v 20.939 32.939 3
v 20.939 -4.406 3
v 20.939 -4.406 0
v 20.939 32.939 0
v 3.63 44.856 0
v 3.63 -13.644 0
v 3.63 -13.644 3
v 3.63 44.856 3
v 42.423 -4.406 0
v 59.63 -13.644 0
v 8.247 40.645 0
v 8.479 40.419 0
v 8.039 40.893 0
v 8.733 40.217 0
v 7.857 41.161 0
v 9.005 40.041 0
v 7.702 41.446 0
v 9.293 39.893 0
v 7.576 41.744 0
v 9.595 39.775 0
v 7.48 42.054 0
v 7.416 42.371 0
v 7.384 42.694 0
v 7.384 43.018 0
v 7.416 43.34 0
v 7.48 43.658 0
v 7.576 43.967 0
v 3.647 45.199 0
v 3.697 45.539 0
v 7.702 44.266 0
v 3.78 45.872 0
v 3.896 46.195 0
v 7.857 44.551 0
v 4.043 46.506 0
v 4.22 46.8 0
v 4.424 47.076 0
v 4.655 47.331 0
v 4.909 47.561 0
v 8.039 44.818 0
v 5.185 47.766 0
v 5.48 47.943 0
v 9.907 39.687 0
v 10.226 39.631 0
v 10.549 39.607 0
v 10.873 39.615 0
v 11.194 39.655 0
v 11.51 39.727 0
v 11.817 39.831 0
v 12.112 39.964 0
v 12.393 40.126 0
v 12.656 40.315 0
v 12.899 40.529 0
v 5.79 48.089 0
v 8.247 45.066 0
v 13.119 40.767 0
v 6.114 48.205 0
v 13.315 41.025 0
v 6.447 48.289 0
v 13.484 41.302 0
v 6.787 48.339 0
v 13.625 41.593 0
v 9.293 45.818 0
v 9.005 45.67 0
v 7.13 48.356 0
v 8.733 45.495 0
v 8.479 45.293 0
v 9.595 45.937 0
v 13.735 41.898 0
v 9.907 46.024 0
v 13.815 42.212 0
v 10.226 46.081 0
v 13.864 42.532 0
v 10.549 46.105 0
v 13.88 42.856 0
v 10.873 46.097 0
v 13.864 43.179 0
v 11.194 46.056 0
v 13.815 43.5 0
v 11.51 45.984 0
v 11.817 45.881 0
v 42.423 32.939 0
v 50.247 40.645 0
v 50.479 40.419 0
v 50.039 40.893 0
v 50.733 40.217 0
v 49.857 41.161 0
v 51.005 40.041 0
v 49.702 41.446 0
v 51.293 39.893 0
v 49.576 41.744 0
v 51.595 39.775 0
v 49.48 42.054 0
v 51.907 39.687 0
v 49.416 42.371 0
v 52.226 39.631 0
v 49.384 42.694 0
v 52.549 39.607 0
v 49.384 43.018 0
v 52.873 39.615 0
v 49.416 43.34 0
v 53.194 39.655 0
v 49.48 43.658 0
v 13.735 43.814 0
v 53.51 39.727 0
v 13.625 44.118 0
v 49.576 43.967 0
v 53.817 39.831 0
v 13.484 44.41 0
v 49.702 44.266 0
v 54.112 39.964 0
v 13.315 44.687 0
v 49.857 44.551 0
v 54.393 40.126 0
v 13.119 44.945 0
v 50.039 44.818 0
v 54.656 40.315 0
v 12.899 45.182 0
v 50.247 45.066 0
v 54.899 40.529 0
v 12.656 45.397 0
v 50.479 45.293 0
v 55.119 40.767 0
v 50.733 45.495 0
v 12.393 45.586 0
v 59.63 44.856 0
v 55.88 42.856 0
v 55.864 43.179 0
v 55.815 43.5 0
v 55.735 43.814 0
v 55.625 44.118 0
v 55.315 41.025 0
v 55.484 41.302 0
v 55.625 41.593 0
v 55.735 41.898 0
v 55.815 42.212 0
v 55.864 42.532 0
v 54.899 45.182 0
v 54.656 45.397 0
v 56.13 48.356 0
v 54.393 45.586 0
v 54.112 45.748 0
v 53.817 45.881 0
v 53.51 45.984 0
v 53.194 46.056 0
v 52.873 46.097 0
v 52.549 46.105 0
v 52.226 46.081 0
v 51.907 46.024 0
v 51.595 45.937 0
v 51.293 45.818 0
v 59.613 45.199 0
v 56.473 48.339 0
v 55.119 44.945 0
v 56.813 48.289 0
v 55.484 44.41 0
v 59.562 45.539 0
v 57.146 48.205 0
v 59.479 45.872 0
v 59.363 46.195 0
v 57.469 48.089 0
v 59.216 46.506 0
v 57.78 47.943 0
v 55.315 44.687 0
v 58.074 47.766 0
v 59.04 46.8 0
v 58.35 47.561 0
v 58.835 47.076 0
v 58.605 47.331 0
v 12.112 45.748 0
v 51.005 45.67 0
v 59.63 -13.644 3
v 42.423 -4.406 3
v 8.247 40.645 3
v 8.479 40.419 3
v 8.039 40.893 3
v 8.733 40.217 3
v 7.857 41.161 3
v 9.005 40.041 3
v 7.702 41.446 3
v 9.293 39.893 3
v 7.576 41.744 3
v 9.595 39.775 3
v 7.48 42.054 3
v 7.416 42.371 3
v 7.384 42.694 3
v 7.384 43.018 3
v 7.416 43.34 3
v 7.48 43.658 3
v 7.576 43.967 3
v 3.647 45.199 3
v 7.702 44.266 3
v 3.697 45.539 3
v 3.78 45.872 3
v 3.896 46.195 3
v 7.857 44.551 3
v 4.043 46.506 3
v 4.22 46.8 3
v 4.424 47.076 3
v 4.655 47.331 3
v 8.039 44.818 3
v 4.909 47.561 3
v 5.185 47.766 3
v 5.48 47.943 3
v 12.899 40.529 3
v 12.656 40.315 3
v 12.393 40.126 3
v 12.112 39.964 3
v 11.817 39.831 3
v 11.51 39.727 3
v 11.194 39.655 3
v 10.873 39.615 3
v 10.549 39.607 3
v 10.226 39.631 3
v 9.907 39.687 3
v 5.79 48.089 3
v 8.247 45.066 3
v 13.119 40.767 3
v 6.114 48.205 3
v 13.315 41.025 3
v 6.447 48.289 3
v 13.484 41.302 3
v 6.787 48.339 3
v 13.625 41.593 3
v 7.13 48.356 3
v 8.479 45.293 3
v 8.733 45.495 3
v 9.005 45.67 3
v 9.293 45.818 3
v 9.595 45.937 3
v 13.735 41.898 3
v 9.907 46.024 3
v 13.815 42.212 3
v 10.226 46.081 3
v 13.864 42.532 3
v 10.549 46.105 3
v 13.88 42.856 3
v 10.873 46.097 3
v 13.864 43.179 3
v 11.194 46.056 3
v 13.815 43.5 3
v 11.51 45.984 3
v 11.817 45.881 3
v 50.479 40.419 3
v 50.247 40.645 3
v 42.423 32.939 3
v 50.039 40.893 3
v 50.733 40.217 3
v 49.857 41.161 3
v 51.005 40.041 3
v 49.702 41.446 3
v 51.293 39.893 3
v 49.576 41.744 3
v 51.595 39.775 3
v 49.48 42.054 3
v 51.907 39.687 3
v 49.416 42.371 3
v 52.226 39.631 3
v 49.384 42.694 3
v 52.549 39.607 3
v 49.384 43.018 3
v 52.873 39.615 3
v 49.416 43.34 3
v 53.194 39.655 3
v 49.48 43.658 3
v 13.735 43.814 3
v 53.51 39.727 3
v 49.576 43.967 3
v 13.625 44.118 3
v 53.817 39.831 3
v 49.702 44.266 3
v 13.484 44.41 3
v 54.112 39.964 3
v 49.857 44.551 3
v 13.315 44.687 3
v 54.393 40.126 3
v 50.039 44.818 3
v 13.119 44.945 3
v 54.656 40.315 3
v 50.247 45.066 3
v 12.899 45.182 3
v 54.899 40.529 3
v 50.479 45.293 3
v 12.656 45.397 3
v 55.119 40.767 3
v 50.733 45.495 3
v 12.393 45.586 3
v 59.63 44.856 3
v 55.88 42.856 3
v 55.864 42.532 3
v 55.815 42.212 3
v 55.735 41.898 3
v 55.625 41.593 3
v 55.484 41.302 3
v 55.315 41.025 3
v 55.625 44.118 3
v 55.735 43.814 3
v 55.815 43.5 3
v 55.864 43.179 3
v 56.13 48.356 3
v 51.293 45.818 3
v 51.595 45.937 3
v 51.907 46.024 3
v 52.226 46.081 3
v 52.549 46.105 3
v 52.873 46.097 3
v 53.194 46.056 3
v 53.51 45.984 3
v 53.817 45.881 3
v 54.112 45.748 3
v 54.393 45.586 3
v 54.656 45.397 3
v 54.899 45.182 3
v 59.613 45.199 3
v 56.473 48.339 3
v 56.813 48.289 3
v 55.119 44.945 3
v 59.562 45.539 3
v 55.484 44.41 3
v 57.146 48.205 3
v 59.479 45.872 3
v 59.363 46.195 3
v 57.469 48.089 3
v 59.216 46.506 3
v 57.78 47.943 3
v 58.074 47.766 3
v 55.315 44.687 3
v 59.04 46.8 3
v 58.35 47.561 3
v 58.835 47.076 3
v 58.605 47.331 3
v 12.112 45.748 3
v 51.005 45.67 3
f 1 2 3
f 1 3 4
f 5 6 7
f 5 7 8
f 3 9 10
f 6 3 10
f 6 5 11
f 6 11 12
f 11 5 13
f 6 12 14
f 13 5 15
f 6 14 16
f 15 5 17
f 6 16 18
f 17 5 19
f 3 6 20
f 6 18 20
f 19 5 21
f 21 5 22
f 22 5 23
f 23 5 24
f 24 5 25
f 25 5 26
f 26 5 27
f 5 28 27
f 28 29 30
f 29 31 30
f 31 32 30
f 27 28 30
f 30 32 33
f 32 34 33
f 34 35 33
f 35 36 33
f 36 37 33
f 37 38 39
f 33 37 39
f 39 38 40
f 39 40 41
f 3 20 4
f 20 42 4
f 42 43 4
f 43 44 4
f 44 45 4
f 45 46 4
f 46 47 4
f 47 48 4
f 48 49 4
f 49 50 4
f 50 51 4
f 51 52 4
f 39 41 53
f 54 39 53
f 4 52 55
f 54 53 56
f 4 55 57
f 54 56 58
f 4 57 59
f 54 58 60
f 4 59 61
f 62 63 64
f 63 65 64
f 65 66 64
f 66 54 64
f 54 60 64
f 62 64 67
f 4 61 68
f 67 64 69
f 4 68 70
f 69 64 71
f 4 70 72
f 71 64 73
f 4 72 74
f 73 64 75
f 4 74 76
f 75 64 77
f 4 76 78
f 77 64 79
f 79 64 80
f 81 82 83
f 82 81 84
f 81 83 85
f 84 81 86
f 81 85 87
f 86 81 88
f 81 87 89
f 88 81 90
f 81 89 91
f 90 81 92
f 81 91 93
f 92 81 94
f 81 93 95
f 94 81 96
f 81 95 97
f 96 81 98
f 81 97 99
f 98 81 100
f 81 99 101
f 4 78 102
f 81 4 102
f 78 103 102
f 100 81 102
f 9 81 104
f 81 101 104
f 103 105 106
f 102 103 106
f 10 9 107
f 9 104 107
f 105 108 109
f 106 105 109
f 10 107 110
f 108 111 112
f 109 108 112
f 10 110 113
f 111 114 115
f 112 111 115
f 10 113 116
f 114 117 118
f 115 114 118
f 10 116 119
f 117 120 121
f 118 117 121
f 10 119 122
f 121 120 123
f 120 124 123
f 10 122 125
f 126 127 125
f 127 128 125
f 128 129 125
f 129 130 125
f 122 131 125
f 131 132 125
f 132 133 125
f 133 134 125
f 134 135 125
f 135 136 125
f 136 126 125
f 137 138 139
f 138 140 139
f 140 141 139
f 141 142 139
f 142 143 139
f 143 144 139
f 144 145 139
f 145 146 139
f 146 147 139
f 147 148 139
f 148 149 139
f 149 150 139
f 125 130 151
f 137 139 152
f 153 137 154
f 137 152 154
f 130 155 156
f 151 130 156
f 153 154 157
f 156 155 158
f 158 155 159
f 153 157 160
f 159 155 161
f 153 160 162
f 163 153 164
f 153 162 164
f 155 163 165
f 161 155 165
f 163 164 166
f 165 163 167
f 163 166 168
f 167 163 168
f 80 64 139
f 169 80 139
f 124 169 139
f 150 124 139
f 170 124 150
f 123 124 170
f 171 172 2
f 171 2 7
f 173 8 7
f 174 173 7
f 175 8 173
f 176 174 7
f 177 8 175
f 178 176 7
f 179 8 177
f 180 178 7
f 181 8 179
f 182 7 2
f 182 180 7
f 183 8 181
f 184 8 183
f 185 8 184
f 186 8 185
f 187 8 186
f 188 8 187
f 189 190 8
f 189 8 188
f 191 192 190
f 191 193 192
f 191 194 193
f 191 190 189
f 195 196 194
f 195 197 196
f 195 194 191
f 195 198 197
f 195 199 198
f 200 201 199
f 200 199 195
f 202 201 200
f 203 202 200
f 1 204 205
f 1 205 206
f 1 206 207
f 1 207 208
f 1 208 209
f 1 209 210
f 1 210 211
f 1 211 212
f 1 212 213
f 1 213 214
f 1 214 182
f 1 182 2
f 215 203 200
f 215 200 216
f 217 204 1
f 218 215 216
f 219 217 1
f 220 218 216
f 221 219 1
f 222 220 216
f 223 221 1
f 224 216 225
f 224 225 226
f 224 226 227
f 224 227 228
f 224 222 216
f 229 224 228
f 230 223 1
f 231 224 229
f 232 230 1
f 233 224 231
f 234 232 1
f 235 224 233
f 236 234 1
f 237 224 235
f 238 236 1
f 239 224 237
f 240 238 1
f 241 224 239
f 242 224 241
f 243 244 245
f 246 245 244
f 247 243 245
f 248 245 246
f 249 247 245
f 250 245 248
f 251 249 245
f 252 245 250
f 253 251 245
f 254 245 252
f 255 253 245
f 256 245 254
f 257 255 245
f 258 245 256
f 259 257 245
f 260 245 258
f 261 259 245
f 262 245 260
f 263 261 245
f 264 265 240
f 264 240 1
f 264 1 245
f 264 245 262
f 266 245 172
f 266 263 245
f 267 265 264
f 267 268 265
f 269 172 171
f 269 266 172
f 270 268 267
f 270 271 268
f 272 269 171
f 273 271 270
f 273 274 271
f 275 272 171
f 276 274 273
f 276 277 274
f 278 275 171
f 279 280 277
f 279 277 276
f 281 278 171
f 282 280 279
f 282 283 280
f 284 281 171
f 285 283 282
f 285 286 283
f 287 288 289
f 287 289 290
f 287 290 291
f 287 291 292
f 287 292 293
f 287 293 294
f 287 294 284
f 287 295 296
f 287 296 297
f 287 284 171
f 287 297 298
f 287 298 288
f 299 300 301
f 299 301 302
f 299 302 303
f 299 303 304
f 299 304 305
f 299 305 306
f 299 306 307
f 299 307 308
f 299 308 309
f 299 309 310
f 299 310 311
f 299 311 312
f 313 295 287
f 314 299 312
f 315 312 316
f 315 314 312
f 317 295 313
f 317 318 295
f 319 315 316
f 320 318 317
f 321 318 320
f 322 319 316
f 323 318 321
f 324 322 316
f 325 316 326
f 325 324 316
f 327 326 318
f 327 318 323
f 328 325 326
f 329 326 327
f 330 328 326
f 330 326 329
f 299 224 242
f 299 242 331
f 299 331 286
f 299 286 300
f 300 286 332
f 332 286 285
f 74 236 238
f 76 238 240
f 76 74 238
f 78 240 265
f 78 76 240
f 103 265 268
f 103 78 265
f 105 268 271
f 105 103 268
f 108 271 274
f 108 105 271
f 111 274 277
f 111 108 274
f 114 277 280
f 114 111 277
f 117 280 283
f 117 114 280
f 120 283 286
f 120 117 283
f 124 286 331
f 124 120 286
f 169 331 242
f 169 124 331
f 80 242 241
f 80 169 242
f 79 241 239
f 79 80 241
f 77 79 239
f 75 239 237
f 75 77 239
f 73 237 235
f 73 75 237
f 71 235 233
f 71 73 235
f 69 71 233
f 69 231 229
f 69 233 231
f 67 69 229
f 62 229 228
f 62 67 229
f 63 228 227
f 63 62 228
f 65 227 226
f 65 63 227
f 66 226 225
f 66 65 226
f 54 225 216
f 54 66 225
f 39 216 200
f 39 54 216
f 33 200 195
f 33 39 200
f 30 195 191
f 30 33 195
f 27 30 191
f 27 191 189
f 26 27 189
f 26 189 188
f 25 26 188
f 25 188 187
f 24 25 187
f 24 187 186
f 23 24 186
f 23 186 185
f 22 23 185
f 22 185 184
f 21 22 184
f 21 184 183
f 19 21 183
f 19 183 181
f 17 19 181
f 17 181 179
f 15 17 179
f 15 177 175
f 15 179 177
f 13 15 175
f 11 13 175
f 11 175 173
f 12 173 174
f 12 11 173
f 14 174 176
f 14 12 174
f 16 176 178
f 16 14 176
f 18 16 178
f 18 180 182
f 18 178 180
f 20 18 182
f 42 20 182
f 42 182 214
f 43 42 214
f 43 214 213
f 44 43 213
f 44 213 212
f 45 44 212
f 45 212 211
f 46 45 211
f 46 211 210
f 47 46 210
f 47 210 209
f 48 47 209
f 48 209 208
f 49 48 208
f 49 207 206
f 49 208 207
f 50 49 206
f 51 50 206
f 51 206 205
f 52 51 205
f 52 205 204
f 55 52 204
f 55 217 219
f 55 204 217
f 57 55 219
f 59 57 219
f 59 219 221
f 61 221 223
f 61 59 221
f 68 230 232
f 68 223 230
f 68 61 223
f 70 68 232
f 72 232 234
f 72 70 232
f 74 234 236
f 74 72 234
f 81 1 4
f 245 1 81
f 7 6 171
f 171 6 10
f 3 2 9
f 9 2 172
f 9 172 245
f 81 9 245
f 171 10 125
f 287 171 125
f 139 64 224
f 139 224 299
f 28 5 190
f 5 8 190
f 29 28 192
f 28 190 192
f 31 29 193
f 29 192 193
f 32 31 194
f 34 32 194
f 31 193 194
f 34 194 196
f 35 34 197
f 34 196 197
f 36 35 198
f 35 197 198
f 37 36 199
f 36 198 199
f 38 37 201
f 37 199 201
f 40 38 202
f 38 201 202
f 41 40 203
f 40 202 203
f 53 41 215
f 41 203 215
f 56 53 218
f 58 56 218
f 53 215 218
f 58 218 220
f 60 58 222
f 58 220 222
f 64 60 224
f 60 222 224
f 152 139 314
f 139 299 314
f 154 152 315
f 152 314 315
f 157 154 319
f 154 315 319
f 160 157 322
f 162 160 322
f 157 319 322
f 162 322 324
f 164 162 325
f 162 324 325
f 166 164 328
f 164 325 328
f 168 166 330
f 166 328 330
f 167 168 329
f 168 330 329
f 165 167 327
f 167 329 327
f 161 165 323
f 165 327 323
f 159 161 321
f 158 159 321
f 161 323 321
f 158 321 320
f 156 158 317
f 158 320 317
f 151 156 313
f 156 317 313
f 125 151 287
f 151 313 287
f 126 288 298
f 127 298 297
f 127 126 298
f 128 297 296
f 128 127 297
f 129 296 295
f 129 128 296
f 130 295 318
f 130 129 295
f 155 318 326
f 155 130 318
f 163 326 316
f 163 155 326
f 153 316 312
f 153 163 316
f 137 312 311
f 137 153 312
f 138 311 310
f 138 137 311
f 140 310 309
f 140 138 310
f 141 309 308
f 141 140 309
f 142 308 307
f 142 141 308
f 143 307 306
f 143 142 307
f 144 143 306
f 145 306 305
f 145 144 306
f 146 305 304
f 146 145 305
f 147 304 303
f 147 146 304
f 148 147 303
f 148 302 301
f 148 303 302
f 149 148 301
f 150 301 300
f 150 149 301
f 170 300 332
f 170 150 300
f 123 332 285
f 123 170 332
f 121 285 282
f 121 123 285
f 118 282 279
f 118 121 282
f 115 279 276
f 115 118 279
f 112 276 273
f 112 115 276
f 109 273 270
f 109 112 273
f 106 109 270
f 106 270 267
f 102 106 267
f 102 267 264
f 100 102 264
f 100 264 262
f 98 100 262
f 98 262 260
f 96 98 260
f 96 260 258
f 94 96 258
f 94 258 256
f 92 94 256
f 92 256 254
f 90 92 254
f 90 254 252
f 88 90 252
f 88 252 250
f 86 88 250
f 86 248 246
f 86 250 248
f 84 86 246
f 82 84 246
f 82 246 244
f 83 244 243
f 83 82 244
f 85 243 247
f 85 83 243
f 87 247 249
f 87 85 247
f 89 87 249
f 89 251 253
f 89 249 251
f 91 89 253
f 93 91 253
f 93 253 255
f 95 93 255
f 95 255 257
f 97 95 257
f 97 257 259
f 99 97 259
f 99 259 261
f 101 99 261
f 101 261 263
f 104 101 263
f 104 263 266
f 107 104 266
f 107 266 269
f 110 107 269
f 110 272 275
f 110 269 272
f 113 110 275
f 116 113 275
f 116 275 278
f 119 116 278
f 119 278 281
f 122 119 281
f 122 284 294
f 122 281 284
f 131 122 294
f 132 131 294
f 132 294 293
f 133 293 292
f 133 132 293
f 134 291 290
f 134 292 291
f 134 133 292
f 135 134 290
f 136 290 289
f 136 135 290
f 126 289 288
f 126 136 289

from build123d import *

# Parameters (mm, degrees)
F0_W     = 56
F0_H     = 62
F1_DEPTH = 3
F2_R     = 3.25
F3_DEPTH = 3.5
F4_R     = 3.5
F5_W     = 21.484168
F5_H     = 37.344906
F6_DEPTH = 3.5


with BuildPart() as f1:
    # F0 (on Top) → F1 (new body)
    with BuildSketch(Plane.XY):
        with Locations((31.62972, 17.355853)):
            Rectangle(F0_W, F0_H)
    extrude(amount=F1_DEPTH)

    # F2 (on Top) → F3 (cut)
    with BuildSketch(Plane.XY):
        with Locations((52.62972, 42.855853)):
            Circle(F2_R)
        with Locations((10.62972, 42.855853)):
            Circle(F2_R)
    extrude(amount=F3_DEPTH, mode=Mode.SUBTRACT)

    # F4
    f4_edges = [f1.edges().sort_by_distance(p)[0] for p in [
        (3.62972, 48.355853, 1.5),
        (59.62972, 48.355853, 1.5),
    ]]
    fillet(f4_edges, radius=F4_R)

    # F5 (on face) → F6 (cut)
    with BuildSketch(Plane.XY.offset(3)):
        with Locations((31.681261, 14.266232)):
            Rectangle(F5_W, F5_H)
    extrude(amount=-F6_DEPTH, mode=Mode.SUBTRACT)


solid = f1.part
